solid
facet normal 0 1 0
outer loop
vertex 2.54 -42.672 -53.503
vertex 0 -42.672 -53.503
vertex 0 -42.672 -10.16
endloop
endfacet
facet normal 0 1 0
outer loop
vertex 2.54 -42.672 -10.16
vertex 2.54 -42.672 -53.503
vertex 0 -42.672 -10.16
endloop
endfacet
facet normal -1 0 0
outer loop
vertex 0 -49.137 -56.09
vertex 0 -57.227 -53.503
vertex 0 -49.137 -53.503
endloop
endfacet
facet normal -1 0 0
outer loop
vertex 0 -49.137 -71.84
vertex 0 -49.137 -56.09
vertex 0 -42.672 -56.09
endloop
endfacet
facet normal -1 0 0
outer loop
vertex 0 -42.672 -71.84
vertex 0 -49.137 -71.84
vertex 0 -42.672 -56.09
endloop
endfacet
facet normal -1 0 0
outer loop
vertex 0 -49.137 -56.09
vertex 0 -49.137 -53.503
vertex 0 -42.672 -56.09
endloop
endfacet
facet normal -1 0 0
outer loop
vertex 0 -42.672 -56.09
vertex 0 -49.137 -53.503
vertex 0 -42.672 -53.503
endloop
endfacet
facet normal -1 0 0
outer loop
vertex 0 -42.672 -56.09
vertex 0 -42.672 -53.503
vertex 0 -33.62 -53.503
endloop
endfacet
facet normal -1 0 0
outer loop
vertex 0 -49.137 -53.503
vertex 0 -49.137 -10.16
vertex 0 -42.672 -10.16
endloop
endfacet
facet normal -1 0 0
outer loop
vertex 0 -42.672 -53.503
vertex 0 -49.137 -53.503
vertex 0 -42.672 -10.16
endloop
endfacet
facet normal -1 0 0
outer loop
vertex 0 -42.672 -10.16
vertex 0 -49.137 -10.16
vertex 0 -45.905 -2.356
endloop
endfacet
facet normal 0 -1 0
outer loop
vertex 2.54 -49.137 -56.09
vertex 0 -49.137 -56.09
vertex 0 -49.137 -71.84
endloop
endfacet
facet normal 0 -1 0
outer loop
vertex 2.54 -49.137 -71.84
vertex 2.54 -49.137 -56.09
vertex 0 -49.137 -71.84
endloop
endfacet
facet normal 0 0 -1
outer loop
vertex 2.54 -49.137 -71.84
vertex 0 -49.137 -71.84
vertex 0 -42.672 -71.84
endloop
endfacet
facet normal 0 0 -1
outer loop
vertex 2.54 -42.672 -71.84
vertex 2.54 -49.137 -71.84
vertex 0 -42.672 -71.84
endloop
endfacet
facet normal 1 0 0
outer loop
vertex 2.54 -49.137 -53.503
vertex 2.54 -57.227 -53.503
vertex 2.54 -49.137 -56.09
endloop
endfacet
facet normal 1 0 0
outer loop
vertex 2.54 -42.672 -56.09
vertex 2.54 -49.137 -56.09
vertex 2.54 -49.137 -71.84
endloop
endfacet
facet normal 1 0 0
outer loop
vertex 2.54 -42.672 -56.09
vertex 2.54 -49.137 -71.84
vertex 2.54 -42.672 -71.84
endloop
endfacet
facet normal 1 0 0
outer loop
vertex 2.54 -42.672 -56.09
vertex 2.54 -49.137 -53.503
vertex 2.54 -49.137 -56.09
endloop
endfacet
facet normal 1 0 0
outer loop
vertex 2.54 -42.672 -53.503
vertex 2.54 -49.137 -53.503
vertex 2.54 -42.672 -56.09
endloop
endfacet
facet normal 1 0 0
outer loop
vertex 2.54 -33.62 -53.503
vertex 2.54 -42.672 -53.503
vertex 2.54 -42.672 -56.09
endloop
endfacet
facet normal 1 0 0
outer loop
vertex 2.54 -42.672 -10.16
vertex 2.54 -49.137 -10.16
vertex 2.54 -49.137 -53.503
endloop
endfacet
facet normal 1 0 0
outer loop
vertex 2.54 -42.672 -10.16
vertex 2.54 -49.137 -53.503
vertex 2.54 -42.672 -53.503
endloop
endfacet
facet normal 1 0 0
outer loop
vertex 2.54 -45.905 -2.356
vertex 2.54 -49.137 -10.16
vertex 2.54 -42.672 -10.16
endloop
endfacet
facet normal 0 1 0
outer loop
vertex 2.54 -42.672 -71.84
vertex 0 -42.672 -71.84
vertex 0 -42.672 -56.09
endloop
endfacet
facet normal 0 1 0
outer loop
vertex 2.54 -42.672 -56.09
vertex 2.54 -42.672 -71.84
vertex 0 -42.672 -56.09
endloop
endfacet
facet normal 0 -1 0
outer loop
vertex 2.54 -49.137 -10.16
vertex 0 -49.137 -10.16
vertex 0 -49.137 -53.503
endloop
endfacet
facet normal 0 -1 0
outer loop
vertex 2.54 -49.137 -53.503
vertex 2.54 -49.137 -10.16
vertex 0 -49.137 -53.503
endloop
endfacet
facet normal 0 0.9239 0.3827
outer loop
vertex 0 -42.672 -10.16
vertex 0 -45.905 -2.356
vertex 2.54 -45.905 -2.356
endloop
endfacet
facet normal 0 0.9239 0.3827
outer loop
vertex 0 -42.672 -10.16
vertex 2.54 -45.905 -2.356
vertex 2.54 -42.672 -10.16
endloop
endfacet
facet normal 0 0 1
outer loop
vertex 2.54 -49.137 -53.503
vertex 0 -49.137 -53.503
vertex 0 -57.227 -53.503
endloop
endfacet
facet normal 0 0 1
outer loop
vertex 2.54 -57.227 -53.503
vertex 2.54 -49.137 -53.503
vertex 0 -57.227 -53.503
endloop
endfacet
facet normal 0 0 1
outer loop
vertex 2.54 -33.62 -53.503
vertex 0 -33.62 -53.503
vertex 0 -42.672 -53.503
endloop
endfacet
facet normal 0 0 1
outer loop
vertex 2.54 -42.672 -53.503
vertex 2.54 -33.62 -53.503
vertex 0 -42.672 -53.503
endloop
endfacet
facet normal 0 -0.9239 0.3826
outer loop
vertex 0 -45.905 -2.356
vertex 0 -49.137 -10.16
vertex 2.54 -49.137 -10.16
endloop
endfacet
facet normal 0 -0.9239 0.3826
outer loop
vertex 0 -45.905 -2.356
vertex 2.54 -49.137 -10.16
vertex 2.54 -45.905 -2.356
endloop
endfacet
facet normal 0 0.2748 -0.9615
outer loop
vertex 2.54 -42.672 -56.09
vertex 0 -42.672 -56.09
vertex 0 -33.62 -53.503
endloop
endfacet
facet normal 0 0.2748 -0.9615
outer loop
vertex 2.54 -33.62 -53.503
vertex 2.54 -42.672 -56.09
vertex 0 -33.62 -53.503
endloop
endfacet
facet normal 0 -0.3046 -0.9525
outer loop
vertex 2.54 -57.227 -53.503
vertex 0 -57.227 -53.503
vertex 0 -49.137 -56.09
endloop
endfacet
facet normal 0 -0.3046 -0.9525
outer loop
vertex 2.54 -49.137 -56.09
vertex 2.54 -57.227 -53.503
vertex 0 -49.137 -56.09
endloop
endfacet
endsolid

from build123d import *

# Parameters (mm, degrees)
F1_DEPTH    = 2.54
F2_T1_DEPTH = 28.6682991577
F3_DEPTH    = 2.54
F4_DEPTH    = 2.54
F5_T1_DEPTH = 28.6682991577
F6_T1_DEPTH = 28.8815311919


# Not quite as in the source:
# - a fillet or chamfer that OpenCascade refuses, or shapes differently, is made with other operations: its cross-section is extruded or revolved along the edge and cut away or added


with BuildPart() as f1:
    # F0 (on Right) → F1 (new body)
    with BuildSketch(Plane.YZ):
        Polygon((-57.2273433208, -53.503472358), (-49.1374544799, -56.0896545649), (-49.1374544799, -53.503472358), align=None)
        Polygon((-49.1374544799, -53.503472358), (-49.1374544799, -56.0896545649), (-42.6720008254, -56.0896545649), (-42.6720008254, -53.503472358), (-42.6720008254, 0), (-49.1374544799, 0), align=None)
        with BuildLine():
            Line((-42.6720008254, -56.0896545649), (-49.1374544799, -56.0896545649))
            Line((-49.1374544799, -56.0896545649), (-49.1374544799, -67.4042031169))
            ThreePointArc((-49.1374544799, -67.4042031169), (-45.9047276527, -64.1714762896), (-42.6720008254, -67.4042031169))
            Line((-42.6720008254, -67.4042031169), (-42.6720008254, -56.0896545649))
        make_face()
        Polygon((-42.6720008254, -53.503472358), (-42.6720008254, -56.0896545649), (-33.620364964, -53.503472358), align=None)
        with BuildLine():
            ThreePointArc((-42.6720008254, -67.4042031169), (-45.9047276527, -70.6369299442), (-49.1374544799, -67.4042031169))
            Line((-49.1374544799, -67.4042031169), (-49.1374544799, -71.8398466706))
            Line((-49.1374544799, -71.8398466706), (-42.6720008254, -71.8398466706))
            Line((-42.6720008254, -71.8398466706), (-42.6720008254, -67.4042031169))
        make_face()
        with BuildLine():
            ThreePointArc((-42.6720008254, -67.4042031169), (-45.9047276527, -64.1714762896), (-49.1374544799, -67.4042031169))
            ThreePointArc((-49.1374544799, -67.4042031169), (-45.9047276527, -70.6369299442), (-42.6720008254, -67.4042031169))
        make_face()
    extrude(amount=F1_DEPTH)

    # F2: chamfer of 5.08 on 2 edges, made by hand

    # F2_s2 → F2_t1 (cut)
    with BuildSketch(Plane.YZ.offset(-13.0641495789)):
        Polygon((-44.0574544799, 0), (-49.1374544799, -5.08), (-49.1374544799, 0), align=None)
        Polygon((-42.6720008254, -5.08), (-47.7520008254, 0), (-42.6720008254, 0), align=None)
    extrude(amount=F2_T1_DEPTH, mode=Mode.SUBTRACT)

    # F0 (on Right) → F3 (join)
    with BuildSketch(Plane.YZ):
        Polygon((-57.2273433208, -53.503472358), (-49.1374544799, -56.0896545649), (-49.1374544799, -53.503472358), align=None)
        Polygon((-49.1374544799, -53.503472358), (-49.1374544799, -56.0896545649), (-42.6720008254, -56.0896545649), (-42.6720008254, -53.503472358), (-42.6720008254, 0), (-49.1374544799, 0), align=None)
        with BuildLine():
            Line((-42.6720008254, -56.0896545649), (-49.1374544799, -56.0896545649))
            Line((-49.1374544799, -56.0896545649), (-49.1374544799, -67.4042031169))
            ThreePointArc((-49.1374544799, -67.4042031169), (-45.9047276527, -64.1714762896), (-42.6720008254, -67.4042031169))
            Line((-42.6720008254, -67.4042031169), (-42.6720008254, -56.0896545649))
        make_face()
        Polygon((-42.6720008254, -53.503472358), (-42.6720008254, -56.0896545649), (-33.620364964, -53.503472358), align=None)
        with BuildLine():
            ThreePointArc((-42.6720008254, -67.4042031169), (-45.9047276527, -70.6369299442), (-49.1374544799, -67.4042031169))
            Line((-49.1374544799, -67.4042031169), (-49.1374544799, -71.8398466706))
            Line((-49.1374544799, -71.8398466706), (-42.6720008254, -71.8398466706))
            Line((-42.6720008254, -71.8398466706), (-42.6720008254, -67.4042031169))
        make_face()
        with BuildLine():
            ThreePointArc((-42.6720008254, -67.4042031169), (-45.9047276527, -64.1714762896), (-49.1374544799, -67.4042031169))
            ThreePointArc((-49.1374544799, -67.4042031169), (-45.9047276527, -70.6369299442), (-42.6720008254, -67.4042031169))
        make_face()
    extrude(amount=F3_DEPTH)

    # F0 (on Right) → F4 (join)
    with BuildSketch(Plane.YZ):
        Polygon((-57.2273433208, -53.503472358), (-49.1374544799, -56.0896545649), (-49.1374544799, -53.503472358), align=None)
        Polygon((-49.1374544799, -53.503472358), (-49.1374544799, -56.0896545649), (-42.6720008254, -56.0896545649), (-42.6720008254, -53.503472358), (-42.6720008254, 0), (-49.1374544799, 0), align=None)
        with BuildLine():
            Line((-42.6720008254, -56.0896545649), (-49.1374544799, -56.0896545649))
            Line((-49.1374544799, -56.0896545649), (-49.1374544799, -67.4042031169))
            ThreePointArc((-49.1374544799, -67.4042031169), (-45.9047276527, -64.1714762896), (-42.6720008254, -67.4042031169))
            Line((-42.6720008254, -67.4042031169), (-42.6720008254, -56.0896545649))
        make_face()
        Polygon((-42.6720008254, -53.503472358), (-42.6720008254, -56.0896545649), (-33.620364964, -53.503472358), align=None)
        with BuildLine():
            ThreePointArc((-42.6720008254, -67.4042031169), (-45.9047276527, -70.6369299442), (-49.1374544799, -67.4042031169))
            Line((-49.1374544799, -67.4042031169), (-49.1374544799, -71.8398466706))
            Line((-49.1374544799, -71.8398466706), (-42.6720008254, -71.8398466706))
            Line((-42.6720008254, -71.8398466706), (-42.6720008254, -67.4042031169))
        make_face()
        with BuildLine():
            ThreePointArc((-42.6720008254, -67.4042031169), (-45.9047276527, -64.1714762896), (-49.1374544799, -67.4042031169))
            ThreePointArc((-49.1374544799, -67.4042031169), (-45.9047276527, -70.6369299442), (-42.6720008254, -67.4042031169))
        make_face()
    extrude(amount=F4_DEPTH)

    # F5: chamfer of 5.08 on 2 edges, made by hand

    # F5_s2 → F5_t1 (cut)
    with BuildSketch(Plane.YZ.offset(-13.0641495789)):
        Polygon((-49.1374544799, -5.08), (-44.0574544799, 0), (-49.1374544799, 0), align=None)
        Polygon((-42.6720008254, -5.08), (-47.7520008254, 0), (-42.6720008254, 0), align=None)
    extrude(amount=F5_T1_DEPTH, mode=Mode.SUBTRACT)

    # F6: chamfer of 5.08 on 2 edges, made by hand

    # F6_s2 → F6_t1 (cut)
    with BuildSketch(Plane.YZ.offset(-13.170765596)):
        Polygon((-49.1374544799, -10.16), (-45.5453520315, -1.4878975516), (-49.1374544799, -5.08), align=None)
        Polygon((-46.2641032738, -1.4878975516), (-42.6720008254, -10.16), (-42.6720008254, -5.08), align=None)
    extrude(amount=F6_T1_DEPTH, mode=Mode.SUBTRACT)


solid = f1.part
